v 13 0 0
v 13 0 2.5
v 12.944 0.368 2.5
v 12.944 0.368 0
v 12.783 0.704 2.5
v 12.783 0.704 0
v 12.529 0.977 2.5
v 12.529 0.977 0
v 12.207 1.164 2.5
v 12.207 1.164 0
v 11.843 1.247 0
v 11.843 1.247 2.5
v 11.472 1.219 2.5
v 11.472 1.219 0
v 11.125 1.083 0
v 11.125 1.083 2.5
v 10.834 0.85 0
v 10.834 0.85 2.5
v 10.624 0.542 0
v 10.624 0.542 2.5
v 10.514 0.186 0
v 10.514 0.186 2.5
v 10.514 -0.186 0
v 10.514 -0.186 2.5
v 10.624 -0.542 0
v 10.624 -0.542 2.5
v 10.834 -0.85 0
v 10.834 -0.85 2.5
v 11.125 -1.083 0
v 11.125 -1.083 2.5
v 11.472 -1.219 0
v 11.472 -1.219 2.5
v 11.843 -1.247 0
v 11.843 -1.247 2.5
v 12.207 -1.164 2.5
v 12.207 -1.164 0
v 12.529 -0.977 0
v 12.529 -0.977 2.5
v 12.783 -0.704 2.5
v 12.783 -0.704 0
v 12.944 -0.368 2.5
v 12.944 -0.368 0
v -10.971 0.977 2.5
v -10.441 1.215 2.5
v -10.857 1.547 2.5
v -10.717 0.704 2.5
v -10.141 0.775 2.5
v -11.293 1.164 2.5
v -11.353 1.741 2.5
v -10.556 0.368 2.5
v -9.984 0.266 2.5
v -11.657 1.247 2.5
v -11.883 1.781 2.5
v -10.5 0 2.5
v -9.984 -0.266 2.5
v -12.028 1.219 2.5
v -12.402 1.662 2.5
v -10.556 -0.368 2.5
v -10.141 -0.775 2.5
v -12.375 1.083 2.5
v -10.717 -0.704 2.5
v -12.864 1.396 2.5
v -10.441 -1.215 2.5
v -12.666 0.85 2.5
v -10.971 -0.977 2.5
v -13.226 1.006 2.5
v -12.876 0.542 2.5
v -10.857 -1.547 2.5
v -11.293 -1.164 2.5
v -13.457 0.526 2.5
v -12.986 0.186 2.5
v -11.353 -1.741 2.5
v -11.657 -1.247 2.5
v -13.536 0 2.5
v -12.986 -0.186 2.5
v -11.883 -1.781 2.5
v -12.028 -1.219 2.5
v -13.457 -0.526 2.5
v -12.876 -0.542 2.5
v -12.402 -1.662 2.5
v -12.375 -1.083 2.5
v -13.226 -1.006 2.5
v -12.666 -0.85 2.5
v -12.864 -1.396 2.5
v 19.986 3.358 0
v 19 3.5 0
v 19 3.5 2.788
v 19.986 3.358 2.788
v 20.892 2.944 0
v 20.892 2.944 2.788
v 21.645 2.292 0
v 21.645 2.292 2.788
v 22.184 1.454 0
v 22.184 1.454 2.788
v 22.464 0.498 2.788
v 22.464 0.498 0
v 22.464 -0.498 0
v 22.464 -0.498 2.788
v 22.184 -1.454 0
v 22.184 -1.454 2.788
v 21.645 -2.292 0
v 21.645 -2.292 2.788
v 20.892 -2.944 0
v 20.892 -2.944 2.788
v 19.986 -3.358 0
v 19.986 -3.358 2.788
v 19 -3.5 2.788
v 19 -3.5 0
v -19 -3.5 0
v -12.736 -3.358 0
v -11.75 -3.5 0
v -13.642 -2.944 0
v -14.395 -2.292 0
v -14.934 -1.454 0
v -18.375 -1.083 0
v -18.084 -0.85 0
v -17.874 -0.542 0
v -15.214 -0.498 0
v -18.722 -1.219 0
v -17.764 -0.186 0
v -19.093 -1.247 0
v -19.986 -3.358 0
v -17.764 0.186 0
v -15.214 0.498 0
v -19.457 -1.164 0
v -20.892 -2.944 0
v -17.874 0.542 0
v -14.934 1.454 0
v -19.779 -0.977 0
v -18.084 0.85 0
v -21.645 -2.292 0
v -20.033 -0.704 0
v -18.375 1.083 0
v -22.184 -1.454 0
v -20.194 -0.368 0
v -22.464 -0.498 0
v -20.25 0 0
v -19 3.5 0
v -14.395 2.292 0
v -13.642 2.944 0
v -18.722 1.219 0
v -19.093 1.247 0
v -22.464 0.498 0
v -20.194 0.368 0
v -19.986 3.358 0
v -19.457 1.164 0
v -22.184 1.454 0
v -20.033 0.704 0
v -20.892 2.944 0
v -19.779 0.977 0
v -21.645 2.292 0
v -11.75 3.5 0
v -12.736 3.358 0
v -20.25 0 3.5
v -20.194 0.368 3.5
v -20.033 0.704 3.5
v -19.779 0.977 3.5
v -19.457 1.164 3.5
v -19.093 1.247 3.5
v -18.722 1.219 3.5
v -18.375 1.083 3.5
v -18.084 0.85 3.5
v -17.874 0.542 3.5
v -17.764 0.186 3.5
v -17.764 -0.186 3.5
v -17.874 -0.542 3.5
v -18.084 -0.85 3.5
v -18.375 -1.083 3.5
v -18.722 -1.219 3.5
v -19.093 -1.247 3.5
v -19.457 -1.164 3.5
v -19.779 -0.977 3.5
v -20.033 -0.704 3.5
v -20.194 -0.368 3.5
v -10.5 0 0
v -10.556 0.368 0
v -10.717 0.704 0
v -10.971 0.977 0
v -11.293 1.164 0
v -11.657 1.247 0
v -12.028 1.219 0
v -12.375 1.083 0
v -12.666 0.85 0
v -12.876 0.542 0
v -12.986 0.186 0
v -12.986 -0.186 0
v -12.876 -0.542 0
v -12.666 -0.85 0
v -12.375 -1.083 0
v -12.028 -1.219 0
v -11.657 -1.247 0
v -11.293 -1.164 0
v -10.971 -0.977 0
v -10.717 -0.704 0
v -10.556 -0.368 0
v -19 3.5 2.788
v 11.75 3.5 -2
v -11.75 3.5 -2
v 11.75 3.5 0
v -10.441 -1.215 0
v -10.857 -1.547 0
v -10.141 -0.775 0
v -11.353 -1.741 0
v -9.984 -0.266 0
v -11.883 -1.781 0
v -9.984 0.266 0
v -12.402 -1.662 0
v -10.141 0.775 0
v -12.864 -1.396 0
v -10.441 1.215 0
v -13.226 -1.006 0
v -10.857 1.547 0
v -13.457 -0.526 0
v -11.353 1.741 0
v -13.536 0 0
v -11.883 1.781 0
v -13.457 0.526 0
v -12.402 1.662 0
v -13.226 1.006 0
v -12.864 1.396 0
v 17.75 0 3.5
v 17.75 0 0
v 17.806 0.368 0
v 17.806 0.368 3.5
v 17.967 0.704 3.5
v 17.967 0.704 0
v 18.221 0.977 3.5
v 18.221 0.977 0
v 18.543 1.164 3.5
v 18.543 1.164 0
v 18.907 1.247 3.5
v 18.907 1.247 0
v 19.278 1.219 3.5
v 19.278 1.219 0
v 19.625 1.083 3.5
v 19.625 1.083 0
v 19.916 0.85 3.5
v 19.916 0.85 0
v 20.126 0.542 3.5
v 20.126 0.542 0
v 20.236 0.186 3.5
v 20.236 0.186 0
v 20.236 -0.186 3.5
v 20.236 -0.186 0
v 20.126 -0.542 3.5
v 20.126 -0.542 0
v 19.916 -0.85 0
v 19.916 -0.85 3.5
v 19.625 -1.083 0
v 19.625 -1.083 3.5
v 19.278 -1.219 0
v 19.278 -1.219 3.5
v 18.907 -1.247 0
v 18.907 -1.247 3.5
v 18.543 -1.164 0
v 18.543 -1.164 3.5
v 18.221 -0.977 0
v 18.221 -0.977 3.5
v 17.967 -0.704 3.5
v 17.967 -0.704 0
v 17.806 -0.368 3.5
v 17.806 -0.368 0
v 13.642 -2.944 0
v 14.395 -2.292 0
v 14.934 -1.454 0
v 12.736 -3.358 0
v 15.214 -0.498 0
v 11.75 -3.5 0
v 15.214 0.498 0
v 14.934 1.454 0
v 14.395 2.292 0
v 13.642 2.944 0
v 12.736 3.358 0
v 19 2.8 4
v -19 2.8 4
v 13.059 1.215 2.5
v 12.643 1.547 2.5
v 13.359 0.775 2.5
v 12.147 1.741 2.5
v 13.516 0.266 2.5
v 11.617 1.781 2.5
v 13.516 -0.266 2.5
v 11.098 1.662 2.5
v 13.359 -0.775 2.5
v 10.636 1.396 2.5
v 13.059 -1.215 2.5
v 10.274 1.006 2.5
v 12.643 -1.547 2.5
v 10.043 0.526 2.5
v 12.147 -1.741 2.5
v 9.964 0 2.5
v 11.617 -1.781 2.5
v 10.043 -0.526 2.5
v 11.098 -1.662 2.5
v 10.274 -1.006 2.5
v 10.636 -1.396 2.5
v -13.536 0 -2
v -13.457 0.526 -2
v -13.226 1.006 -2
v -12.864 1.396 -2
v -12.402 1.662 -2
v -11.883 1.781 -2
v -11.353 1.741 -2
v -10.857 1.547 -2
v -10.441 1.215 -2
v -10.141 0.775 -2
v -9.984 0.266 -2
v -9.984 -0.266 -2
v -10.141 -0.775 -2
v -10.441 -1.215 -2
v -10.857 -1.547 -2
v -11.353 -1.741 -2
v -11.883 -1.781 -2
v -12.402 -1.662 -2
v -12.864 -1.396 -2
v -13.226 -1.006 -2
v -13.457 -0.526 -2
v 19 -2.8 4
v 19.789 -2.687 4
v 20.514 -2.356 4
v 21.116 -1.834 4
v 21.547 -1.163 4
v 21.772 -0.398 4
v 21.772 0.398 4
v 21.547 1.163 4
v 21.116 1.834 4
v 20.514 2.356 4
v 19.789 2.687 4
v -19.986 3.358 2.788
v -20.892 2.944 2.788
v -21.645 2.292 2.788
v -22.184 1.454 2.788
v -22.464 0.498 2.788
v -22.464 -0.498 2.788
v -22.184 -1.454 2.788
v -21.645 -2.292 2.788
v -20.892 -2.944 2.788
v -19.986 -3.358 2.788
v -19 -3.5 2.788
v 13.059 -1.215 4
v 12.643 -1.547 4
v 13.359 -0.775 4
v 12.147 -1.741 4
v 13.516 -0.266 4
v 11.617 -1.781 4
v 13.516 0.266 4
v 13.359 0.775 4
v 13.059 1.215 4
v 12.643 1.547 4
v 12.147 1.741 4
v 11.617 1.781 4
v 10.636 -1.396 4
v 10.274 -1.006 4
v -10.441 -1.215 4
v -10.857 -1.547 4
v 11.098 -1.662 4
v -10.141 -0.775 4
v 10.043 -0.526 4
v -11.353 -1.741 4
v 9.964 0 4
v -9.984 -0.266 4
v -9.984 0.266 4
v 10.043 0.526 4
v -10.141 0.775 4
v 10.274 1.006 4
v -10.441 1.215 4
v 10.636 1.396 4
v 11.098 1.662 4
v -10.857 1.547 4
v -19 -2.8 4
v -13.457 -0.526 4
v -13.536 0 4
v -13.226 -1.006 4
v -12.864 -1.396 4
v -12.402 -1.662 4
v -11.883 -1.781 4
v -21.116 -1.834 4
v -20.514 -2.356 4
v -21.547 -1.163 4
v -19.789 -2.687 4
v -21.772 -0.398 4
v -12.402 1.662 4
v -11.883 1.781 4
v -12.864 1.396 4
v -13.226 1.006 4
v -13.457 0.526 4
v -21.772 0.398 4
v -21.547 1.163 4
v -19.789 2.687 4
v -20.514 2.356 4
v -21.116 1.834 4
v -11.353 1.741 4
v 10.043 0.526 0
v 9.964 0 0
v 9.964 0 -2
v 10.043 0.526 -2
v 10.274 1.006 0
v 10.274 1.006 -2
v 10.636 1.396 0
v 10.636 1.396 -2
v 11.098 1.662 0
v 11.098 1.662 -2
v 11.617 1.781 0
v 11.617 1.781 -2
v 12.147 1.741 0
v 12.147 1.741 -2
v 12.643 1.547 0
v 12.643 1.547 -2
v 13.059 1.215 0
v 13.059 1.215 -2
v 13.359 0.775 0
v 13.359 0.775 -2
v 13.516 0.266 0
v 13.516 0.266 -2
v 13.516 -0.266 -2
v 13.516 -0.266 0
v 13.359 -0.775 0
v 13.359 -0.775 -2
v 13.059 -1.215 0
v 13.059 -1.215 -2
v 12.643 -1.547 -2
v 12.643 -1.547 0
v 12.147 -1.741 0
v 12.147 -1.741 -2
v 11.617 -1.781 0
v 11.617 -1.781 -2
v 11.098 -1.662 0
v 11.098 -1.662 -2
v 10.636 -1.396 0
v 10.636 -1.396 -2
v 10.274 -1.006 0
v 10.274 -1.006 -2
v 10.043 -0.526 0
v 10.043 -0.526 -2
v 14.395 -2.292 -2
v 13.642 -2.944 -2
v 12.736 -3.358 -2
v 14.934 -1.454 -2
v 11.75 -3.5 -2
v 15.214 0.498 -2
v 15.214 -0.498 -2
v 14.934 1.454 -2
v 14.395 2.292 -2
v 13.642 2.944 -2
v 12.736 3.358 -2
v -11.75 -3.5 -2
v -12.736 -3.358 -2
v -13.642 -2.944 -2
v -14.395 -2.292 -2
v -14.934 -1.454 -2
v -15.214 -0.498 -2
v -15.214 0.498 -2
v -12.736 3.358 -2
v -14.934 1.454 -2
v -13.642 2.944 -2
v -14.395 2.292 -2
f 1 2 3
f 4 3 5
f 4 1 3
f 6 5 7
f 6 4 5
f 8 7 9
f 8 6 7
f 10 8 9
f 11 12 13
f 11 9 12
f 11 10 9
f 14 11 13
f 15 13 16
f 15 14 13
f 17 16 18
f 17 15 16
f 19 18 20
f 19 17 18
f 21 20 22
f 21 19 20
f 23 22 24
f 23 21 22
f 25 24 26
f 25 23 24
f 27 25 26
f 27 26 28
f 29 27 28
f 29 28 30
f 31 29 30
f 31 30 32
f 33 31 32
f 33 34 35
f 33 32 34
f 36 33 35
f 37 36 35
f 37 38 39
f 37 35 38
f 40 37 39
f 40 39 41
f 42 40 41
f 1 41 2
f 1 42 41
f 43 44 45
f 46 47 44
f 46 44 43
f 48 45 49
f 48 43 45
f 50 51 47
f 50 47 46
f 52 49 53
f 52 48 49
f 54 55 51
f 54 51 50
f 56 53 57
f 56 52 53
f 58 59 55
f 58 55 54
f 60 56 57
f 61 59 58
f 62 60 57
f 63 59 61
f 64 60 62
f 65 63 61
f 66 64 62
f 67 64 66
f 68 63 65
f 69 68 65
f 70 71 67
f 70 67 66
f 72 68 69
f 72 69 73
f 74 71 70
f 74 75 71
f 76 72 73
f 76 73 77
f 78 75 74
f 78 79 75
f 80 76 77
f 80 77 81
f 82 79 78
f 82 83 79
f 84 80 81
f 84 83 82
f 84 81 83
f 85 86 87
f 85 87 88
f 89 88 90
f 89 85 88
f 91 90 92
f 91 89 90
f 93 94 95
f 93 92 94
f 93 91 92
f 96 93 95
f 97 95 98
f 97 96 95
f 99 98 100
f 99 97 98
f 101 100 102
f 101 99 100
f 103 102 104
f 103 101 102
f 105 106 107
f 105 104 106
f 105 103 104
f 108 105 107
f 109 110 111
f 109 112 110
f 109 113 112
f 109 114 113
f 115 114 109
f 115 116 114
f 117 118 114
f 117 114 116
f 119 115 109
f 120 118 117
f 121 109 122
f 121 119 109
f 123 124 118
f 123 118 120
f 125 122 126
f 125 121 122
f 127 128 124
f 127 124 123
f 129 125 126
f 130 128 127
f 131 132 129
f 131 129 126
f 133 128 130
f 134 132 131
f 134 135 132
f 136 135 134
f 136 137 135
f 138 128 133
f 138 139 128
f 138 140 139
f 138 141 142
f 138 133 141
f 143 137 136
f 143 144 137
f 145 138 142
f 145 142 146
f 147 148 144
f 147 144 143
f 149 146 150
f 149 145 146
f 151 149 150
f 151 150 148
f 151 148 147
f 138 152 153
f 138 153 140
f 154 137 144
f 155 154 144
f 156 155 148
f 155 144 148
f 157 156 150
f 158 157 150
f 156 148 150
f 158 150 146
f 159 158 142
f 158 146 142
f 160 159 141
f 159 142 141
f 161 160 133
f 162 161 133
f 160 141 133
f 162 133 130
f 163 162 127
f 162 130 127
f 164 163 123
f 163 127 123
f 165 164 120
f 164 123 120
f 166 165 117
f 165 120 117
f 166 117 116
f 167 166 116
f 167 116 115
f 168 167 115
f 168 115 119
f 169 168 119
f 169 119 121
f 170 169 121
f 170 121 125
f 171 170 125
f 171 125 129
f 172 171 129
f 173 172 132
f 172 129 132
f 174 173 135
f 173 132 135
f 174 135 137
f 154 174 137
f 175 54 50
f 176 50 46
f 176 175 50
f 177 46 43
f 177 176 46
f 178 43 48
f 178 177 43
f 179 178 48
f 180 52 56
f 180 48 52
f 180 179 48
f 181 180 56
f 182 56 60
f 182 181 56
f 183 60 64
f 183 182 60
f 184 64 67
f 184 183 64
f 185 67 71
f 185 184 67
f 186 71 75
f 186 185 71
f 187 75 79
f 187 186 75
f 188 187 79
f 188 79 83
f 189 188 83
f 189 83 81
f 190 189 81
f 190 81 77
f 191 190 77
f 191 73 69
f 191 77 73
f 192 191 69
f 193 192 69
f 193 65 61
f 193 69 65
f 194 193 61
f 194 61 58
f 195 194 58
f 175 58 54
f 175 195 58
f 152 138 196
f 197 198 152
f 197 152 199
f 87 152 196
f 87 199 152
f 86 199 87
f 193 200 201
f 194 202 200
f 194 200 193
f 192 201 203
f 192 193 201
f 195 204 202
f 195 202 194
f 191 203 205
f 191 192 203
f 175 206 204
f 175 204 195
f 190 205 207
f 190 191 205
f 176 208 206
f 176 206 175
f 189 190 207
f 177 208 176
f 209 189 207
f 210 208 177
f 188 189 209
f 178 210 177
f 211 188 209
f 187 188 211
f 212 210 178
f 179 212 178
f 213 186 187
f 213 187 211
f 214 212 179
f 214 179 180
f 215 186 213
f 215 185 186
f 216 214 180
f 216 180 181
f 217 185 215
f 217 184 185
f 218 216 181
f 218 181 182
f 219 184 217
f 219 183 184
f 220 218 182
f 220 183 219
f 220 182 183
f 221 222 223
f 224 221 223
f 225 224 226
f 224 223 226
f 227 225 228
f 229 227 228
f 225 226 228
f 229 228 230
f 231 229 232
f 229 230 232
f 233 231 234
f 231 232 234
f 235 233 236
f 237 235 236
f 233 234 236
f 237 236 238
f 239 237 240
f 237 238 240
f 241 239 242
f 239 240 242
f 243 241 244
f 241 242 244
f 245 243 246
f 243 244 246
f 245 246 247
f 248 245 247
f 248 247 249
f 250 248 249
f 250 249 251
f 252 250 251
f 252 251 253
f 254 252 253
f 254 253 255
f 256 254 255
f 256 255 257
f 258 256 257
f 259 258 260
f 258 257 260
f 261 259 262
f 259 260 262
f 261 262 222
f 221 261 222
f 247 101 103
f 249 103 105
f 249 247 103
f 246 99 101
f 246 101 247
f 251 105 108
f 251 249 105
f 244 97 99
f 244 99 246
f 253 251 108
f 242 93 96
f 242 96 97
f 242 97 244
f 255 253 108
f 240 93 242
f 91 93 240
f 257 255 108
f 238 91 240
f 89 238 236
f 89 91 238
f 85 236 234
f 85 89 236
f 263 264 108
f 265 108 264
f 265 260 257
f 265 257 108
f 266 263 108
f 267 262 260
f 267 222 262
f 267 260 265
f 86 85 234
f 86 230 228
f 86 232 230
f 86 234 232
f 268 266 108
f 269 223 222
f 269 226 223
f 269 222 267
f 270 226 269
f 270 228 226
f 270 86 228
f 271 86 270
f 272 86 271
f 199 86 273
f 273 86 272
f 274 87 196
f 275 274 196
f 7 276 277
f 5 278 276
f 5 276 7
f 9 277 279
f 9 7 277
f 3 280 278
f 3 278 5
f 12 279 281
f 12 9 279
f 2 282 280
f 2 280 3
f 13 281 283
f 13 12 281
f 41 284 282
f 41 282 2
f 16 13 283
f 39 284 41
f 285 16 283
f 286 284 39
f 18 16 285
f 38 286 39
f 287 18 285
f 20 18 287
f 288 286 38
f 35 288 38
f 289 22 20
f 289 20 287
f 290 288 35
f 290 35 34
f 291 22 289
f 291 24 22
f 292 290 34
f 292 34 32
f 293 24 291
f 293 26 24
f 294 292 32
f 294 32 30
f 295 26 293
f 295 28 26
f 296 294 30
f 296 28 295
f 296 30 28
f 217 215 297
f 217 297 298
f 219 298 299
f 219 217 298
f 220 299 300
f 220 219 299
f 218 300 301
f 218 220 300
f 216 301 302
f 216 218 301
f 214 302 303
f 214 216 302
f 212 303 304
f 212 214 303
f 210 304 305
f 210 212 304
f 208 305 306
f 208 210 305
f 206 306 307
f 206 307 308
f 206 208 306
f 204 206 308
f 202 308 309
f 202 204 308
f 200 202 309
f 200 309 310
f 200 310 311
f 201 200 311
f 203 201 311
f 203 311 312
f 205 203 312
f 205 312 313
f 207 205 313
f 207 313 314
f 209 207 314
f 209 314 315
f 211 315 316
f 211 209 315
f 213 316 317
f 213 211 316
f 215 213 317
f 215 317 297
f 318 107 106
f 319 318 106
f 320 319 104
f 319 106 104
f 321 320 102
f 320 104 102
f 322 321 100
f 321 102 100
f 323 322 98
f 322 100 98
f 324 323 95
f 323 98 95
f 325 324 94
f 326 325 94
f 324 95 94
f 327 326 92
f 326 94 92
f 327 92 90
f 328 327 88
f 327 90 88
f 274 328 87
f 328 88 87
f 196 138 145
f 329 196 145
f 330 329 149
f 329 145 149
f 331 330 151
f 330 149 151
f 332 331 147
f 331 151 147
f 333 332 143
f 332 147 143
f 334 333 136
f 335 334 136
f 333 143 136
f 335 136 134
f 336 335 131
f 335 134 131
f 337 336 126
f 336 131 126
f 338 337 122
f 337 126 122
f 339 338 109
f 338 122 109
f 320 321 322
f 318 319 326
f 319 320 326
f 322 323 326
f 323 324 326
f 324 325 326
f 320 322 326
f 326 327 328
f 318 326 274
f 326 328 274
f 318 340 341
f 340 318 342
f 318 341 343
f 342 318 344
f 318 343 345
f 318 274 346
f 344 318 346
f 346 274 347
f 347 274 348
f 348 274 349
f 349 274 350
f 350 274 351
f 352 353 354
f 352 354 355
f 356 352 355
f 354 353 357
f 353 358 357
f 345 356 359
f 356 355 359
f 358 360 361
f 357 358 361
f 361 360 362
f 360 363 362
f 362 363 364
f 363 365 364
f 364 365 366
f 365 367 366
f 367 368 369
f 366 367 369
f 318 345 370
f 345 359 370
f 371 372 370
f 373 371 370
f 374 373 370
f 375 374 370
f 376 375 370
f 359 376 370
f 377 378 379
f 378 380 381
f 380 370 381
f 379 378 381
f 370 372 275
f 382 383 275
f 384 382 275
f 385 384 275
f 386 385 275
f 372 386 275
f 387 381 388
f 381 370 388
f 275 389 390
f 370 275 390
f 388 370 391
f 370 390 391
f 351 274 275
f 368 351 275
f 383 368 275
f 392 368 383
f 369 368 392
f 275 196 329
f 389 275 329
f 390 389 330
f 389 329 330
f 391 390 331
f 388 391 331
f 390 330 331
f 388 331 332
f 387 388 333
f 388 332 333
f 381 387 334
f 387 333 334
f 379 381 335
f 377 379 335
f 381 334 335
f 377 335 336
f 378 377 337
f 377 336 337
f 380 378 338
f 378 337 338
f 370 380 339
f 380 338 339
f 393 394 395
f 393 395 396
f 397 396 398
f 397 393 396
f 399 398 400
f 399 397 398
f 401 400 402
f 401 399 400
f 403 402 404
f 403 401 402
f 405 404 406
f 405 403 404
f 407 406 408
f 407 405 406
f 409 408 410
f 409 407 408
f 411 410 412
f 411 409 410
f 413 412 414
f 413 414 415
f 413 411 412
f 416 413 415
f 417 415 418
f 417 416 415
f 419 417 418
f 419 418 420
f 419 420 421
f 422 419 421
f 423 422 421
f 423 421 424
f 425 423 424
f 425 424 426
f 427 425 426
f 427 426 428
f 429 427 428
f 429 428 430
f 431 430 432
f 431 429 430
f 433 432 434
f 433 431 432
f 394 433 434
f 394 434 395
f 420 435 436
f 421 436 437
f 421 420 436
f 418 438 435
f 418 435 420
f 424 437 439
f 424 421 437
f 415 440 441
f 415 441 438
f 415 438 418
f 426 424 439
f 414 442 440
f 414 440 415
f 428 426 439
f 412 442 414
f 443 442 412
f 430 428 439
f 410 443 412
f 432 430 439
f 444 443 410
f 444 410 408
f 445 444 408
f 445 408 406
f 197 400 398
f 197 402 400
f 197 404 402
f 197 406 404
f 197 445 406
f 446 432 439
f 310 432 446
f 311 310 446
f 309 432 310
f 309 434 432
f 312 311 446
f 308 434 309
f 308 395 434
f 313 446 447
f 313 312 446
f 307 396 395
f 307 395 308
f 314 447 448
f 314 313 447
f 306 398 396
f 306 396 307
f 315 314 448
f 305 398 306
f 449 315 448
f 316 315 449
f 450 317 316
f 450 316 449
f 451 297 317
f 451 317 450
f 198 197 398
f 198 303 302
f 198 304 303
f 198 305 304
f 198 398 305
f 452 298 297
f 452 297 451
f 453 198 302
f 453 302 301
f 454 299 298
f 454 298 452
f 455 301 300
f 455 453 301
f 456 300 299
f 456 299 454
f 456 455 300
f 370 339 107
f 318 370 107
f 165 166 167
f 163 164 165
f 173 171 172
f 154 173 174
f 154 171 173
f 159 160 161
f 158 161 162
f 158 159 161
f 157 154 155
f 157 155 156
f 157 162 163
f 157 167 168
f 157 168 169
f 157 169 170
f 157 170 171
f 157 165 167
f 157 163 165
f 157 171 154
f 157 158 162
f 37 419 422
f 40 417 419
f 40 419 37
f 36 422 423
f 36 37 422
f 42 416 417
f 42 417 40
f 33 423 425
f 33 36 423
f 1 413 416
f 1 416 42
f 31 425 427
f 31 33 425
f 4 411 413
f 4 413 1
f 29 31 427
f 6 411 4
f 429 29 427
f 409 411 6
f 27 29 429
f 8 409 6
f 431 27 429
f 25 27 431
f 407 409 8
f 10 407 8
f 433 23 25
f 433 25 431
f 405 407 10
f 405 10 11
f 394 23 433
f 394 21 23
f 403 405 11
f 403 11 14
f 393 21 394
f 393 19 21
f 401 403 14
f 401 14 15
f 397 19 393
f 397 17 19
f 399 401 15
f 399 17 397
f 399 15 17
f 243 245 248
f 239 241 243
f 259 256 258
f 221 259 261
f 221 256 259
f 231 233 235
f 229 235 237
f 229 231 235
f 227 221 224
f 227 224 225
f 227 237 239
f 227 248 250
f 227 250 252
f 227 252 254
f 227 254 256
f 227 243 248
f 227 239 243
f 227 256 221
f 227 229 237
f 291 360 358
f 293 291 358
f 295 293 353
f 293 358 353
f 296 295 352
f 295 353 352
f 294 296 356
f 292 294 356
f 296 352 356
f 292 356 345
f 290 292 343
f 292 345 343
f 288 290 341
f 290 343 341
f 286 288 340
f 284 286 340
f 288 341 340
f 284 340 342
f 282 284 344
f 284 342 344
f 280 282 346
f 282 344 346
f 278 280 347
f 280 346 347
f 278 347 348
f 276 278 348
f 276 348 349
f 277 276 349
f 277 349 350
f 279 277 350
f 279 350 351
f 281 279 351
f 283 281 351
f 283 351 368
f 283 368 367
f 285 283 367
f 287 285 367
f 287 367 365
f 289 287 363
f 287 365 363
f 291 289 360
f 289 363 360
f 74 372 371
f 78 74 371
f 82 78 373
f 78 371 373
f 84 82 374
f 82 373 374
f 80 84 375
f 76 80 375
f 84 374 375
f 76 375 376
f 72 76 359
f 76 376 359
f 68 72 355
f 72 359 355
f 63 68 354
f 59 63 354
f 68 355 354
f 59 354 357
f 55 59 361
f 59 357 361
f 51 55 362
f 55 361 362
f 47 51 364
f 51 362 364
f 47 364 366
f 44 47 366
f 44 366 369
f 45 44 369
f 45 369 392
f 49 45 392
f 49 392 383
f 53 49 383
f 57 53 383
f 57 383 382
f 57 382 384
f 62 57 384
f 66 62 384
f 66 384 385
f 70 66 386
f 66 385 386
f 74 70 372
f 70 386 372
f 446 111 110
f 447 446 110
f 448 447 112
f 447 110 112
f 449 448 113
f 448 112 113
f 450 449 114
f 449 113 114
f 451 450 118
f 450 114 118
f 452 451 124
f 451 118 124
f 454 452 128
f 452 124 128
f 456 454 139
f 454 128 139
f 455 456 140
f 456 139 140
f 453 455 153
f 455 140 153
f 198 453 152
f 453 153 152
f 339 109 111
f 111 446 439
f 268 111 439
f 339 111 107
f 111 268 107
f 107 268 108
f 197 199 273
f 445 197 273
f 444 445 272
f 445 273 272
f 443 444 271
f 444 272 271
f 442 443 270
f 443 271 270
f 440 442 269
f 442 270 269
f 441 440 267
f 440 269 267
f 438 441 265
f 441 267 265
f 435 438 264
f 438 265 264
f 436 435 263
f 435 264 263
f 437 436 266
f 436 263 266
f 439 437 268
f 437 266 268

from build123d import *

# Parameters (mm, degrees)
SKETCH1_R           = 1.25
BOSS_EXTRUDE1_DEPTH = 4
CHAMFER1_SIZE       = 0.7
CHAMFER1_SIZE2      = 1.212435565
SKETCH2_R           = 1.78594
BOSS_EXTRUDE2_DEPTH = 2
SKETCH3_R           = 1.25
CUT_EXTRUDE1_DEPTH  = 3.5
SKETCH4_R           = 1.78594
CUT_EXTRUDE2_DEPTH  = 1.5


with BuildPart() as part:
    # Sketch1 → Boss-Extrude1 (new body)
    with BuildSketch(Plane.XY):
        with BuildLine():
            Line((19, 3.5), (-19, 3.5))
            ThreePointArc((-19, 3.5), (-22.5, 0), (-19, -3.5))
            Line((-19, -3.5), (19, -3.5))
            ThreePointArc((19, -3.5), (22.5, 0), (19, 3.5))
        make_face()
        with Locations((-11.75, 0)):
            Circle(SKETCH1_R, mode=Mode.SUBTRACT)
        with Locations((11.75, 0)):
            Circle(SKETCH1_R, mode=Mode.SUBTRACT)
    extrude(amount=BOSS_EXTRUDE1_DEPTH)

    # Chamfer1
    chamfer1_edges = [part.edges().sort_by_distance(p)[0] for p in [
        (0, -3.5, 4),
        (-22.5, 0, 4),
        (22.5, 0, 4),
        (0, 3.5, 4),
    ]]
    chamfer1_side = [part.faces().sort_by_distance(p)[0] for p in [
        (0, 0, 4),
    ]]
    chamfer(chamfer1_edges, length=CHAMFER1_SIZE, length2=CHAMFER1_SIZE2, reference=chamfer1_side[0])

    # Sketch2 → Boss-Extrude2 (add)
    with BuildSketch(Plane(origin=(0, 0, 0), x_dir=(-1, 0, 0), z_dir=(0, 0, -1))):
        with BuildLine():
            Line((11.75, 3.5), (-11.75, 3.5))
            ThreePointArc((-11.75, 3.5), (-15.25, 0), (-11.75, -3.5))
            Line((-11.75, -3.5), (11.75, -3.5))
            ThreePointArc((11.75, -3.5), (15.25, 0), (11.75, 3.5))
        make_face()
        with Locations((11.75, 0)):
            Circle(SKETCH2_R, mode=Mode.SUBTRACT)
        with Locations((-11.75, 0)):
            Circle(SKETCH2_R, mode=Mode.SUBTRACT)
    extrude(amount=BOSS_EXTRUDE2_DEPTH)

    # Sketch3 → Cut-Extrude1 (cut)
    with BuildSketch(Plane(origin=(0, 0, 0), x_dir=(-1, 0, 0), z_dir=(0, 0, -1))):
        with Locations((-19, 0)):
            Circle(SKETCH3_R)
        with Locations((19, 0)):
            Circle(SKETCH3_R)
    extrude(amount=-CUT_EXTRUDE1_DEPTH, mode=Mode.SUBTRACT)

    # Sketch4 → Cut-Extrude2 (cut)
    with BuildSketch(Plane.XY.offset(4)):
        with Locations((-11.75, 0)):
            Circle(SKETCH4_R)
        with Locations((11.75, 0)):
            Circle(SKETCH4_R)
    extrude(amount=-CUT_EXTRUDE2_DEPTH, mode=Mode.SUBTRACT)


solid = part.part
